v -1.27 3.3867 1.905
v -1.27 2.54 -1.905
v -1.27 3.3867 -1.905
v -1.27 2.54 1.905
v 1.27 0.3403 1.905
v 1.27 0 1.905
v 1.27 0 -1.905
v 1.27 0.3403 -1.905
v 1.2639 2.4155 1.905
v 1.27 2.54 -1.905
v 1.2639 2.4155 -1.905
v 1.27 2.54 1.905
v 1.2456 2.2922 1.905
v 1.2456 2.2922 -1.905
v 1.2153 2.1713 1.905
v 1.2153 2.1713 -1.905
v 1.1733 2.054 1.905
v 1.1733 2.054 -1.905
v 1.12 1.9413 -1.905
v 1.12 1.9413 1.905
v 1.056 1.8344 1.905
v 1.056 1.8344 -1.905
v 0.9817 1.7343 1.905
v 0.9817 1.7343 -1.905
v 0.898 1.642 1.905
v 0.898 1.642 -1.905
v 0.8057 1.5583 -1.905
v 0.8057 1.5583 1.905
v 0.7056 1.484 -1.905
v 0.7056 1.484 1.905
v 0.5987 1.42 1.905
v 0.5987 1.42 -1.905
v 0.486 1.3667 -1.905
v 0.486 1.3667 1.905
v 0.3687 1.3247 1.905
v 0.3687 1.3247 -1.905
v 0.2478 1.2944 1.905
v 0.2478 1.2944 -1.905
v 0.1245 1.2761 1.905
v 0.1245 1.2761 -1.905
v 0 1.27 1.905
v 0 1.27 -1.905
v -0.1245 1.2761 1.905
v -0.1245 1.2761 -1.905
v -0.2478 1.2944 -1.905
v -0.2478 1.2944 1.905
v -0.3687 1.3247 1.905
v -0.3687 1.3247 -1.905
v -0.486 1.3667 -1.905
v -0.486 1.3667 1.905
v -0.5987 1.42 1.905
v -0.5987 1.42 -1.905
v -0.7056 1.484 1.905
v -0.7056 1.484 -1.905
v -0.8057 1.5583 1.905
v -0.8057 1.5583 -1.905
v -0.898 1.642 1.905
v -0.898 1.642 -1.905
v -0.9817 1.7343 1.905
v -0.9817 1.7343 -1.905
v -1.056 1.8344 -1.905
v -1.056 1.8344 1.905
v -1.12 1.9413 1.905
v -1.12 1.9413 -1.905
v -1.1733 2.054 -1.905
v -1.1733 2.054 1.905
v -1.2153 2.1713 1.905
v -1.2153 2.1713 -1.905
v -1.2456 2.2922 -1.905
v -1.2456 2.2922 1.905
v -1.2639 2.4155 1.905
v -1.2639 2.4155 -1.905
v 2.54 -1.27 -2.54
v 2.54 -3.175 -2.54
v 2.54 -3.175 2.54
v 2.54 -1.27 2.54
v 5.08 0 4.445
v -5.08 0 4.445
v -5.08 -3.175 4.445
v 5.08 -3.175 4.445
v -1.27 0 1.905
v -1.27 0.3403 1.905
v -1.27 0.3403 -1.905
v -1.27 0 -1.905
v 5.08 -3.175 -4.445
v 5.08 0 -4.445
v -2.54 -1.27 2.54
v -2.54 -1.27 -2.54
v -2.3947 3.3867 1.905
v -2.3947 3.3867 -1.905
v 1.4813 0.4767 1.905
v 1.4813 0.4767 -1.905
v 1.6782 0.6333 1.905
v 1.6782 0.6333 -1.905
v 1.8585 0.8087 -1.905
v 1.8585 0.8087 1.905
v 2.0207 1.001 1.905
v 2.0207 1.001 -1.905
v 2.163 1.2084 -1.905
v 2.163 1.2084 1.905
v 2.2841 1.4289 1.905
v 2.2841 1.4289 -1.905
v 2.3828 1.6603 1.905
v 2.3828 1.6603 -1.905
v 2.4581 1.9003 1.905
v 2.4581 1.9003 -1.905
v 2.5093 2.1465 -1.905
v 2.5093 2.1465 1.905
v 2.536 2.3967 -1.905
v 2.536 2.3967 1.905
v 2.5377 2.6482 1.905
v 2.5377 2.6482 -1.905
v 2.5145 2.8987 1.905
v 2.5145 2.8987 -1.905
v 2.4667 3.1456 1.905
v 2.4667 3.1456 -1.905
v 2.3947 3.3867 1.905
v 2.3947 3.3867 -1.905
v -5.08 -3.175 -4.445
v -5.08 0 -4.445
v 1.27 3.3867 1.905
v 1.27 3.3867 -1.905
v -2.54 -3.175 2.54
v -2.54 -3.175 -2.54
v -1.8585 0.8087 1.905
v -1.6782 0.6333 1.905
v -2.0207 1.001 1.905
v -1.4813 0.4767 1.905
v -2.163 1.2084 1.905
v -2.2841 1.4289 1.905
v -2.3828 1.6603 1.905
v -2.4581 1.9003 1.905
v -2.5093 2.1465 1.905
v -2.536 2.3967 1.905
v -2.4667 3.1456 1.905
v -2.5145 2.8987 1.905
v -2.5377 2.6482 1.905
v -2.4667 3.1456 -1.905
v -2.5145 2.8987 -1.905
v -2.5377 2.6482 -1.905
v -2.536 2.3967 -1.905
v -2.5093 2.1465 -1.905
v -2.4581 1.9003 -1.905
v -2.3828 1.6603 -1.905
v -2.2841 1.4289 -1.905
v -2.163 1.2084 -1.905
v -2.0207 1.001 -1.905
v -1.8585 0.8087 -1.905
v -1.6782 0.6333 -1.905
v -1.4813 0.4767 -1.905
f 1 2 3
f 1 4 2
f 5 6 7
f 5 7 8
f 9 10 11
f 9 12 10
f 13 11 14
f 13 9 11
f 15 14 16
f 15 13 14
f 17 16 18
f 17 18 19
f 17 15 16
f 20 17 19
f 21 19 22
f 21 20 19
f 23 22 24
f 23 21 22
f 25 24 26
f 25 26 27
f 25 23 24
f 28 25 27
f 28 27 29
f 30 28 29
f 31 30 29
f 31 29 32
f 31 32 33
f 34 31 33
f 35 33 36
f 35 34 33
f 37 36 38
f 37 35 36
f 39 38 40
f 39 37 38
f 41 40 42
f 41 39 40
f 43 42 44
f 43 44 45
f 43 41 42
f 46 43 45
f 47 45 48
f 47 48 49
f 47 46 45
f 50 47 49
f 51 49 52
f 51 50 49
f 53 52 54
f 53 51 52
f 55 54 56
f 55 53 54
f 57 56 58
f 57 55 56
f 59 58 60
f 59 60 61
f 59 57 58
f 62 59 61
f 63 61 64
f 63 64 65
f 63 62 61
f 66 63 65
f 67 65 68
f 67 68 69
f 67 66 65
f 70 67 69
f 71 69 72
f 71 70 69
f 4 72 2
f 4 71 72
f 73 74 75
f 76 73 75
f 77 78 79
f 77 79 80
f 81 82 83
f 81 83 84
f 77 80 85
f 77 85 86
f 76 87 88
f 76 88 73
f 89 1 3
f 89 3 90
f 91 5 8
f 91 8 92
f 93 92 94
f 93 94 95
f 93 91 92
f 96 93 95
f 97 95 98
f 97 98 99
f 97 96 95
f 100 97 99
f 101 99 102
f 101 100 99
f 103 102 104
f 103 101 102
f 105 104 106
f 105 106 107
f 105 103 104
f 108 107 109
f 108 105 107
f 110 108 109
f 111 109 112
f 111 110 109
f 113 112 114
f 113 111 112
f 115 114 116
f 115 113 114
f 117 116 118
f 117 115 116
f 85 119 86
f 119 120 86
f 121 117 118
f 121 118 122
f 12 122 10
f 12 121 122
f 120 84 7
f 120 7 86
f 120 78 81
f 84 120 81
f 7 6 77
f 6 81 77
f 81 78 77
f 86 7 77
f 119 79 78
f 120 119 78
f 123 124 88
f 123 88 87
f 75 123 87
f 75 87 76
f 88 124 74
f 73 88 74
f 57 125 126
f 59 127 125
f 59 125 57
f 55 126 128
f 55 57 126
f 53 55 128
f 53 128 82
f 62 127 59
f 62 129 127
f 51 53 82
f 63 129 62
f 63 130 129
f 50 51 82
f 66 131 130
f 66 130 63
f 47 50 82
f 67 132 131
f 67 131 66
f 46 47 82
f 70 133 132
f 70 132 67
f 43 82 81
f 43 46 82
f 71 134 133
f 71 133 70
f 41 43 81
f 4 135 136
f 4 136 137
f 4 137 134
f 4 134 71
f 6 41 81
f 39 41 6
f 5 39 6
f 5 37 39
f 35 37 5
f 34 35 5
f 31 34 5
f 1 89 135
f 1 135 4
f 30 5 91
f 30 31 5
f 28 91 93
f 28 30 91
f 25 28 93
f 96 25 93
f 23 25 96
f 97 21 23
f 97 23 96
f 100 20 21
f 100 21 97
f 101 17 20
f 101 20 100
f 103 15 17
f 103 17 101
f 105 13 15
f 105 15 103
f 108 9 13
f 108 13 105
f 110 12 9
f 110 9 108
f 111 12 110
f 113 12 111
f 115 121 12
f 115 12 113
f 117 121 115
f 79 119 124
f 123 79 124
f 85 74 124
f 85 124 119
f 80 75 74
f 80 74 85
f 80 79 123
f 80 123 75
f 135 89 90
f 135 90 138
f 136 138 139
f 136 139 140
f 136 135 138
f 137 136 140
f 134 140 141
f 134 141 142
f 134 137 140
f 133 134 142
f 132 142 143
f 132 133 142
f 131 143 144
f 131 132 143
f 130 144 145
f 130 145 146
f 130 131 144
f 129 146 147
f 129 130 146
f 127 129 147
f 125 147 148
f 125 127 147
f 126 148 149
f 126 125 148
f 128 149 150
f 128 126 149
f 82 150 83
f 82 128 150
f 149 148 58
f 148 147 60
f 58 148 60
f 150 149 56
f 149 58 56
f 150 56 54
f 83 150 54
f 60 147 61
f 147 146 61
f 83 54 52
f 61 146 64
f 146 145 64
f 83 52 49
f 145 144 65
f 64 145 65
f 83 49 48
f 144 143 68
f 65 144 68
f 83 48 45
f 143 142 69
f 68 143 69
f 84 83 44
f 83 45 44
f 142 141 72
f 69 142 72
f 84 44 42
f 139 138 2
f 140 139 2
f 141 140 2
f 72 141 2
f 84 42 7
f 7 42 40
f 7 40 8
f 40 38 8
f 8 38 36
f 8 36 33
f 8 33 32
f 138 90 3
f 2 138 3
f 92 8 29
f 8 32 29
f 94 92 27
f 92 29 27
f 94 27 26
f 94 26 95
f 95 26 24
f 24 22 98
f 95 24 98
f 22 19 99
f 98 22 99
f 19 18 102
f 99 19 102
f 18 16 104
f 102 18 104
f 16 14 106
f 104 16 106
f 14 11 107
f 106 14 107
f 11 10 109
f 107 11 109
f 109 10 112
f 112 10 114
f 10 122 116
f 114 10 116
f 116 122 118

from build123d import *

# Parameters (mm, degrees)
SKETCH1_W           = 10.16
SKETCH1_H           = 3.175
BOSS_EXTRUDE1_DEPTH = 4.445
BOSS_EXTRUDE2_DEPTH = 1.905
SKETCH3_OUTSIDE_W   = 15.162
SKETCH3_OUTSIDE_H   = 13.892
SKETCH3_OUTSIDE_W_2 = 10.16
SKETCH3_OUTSIDE_H_2 = 8.89
SKETCH3_OUTSIDE_W_3 = 5.08
SKETCH3_OUTSIDE_H_3 = 5.08
CUT_EXTRUDE1_DEPTH  = 1.905


with BuildPart() as part:
    # Sketch1 → Boss-Extrude1 (new body, symmetric)
    with BuildSketch(Plane.XY):
        with Locations((0, -1.5875)):
            Rectangle(SKETCH1_W, SKETCH1_H)
    extrude(amount=BOSS_EXTRUDE1_DEPTH, both=True)

    # Sketch2 → Boss-Extrude2 (add, symmetric)
    with BuildSketch(Plane.XY):
        with BuildLine():
            Line((-1.27, 2.54), (-1.27, 3.386666667))
            Line((-1.27, 3.386666667), (-2.394734966, 3.386666667))
            ThreePointArc((-2.394734966, 3.386666667), (-2.382785125, 1.660264217), (-1.27, 0.340295474))
            Line((-1.27, 0.340295474), (-1.27, 0))
            Line((-1.27, 0), (1.27, 0))
            Line((1.27, 0), (1.27, 0.340295474))
            ThreePointArc((1.27, 0.340295474), (2.382785125, 1.660264217), (2.394734966, 3.386666667))
            Line((2.394734966, 3.386666667), (1.27, 3.386666667))
            Line((1.27, 3.386666667), (1.27, 2.54))
            ThreePointArc((1.27, 2.54), (0, 1.27), (-1.27, 2.54))
        make_face()
    extrude(amount=BOSS_EXTRUDE2_DEPTH, both=True)

    # Sketch3 outside → Cut-Extrude1 (cut)
    with BuildSketch(Plane.XZ.offset(3.175)):
        Rectangle(SKETCH3_OUTSIDE_W, SKETCH3_OUTSIDE_H)
        Rectangle(SKETCH3_OUTSIDE_W_2, SKETCH3_OUTSIDE_H_2, mode=Mode.SUBTRACT)
        Rectangle(SKETCH3_OUTSIDE_W_3, SKETCH3_OUTSIDE_H_3)
    extrude(amount=-CUT_EXTRUDE1_DEPTH, mode=Mode.SUBTRACT)


solid = part.part
